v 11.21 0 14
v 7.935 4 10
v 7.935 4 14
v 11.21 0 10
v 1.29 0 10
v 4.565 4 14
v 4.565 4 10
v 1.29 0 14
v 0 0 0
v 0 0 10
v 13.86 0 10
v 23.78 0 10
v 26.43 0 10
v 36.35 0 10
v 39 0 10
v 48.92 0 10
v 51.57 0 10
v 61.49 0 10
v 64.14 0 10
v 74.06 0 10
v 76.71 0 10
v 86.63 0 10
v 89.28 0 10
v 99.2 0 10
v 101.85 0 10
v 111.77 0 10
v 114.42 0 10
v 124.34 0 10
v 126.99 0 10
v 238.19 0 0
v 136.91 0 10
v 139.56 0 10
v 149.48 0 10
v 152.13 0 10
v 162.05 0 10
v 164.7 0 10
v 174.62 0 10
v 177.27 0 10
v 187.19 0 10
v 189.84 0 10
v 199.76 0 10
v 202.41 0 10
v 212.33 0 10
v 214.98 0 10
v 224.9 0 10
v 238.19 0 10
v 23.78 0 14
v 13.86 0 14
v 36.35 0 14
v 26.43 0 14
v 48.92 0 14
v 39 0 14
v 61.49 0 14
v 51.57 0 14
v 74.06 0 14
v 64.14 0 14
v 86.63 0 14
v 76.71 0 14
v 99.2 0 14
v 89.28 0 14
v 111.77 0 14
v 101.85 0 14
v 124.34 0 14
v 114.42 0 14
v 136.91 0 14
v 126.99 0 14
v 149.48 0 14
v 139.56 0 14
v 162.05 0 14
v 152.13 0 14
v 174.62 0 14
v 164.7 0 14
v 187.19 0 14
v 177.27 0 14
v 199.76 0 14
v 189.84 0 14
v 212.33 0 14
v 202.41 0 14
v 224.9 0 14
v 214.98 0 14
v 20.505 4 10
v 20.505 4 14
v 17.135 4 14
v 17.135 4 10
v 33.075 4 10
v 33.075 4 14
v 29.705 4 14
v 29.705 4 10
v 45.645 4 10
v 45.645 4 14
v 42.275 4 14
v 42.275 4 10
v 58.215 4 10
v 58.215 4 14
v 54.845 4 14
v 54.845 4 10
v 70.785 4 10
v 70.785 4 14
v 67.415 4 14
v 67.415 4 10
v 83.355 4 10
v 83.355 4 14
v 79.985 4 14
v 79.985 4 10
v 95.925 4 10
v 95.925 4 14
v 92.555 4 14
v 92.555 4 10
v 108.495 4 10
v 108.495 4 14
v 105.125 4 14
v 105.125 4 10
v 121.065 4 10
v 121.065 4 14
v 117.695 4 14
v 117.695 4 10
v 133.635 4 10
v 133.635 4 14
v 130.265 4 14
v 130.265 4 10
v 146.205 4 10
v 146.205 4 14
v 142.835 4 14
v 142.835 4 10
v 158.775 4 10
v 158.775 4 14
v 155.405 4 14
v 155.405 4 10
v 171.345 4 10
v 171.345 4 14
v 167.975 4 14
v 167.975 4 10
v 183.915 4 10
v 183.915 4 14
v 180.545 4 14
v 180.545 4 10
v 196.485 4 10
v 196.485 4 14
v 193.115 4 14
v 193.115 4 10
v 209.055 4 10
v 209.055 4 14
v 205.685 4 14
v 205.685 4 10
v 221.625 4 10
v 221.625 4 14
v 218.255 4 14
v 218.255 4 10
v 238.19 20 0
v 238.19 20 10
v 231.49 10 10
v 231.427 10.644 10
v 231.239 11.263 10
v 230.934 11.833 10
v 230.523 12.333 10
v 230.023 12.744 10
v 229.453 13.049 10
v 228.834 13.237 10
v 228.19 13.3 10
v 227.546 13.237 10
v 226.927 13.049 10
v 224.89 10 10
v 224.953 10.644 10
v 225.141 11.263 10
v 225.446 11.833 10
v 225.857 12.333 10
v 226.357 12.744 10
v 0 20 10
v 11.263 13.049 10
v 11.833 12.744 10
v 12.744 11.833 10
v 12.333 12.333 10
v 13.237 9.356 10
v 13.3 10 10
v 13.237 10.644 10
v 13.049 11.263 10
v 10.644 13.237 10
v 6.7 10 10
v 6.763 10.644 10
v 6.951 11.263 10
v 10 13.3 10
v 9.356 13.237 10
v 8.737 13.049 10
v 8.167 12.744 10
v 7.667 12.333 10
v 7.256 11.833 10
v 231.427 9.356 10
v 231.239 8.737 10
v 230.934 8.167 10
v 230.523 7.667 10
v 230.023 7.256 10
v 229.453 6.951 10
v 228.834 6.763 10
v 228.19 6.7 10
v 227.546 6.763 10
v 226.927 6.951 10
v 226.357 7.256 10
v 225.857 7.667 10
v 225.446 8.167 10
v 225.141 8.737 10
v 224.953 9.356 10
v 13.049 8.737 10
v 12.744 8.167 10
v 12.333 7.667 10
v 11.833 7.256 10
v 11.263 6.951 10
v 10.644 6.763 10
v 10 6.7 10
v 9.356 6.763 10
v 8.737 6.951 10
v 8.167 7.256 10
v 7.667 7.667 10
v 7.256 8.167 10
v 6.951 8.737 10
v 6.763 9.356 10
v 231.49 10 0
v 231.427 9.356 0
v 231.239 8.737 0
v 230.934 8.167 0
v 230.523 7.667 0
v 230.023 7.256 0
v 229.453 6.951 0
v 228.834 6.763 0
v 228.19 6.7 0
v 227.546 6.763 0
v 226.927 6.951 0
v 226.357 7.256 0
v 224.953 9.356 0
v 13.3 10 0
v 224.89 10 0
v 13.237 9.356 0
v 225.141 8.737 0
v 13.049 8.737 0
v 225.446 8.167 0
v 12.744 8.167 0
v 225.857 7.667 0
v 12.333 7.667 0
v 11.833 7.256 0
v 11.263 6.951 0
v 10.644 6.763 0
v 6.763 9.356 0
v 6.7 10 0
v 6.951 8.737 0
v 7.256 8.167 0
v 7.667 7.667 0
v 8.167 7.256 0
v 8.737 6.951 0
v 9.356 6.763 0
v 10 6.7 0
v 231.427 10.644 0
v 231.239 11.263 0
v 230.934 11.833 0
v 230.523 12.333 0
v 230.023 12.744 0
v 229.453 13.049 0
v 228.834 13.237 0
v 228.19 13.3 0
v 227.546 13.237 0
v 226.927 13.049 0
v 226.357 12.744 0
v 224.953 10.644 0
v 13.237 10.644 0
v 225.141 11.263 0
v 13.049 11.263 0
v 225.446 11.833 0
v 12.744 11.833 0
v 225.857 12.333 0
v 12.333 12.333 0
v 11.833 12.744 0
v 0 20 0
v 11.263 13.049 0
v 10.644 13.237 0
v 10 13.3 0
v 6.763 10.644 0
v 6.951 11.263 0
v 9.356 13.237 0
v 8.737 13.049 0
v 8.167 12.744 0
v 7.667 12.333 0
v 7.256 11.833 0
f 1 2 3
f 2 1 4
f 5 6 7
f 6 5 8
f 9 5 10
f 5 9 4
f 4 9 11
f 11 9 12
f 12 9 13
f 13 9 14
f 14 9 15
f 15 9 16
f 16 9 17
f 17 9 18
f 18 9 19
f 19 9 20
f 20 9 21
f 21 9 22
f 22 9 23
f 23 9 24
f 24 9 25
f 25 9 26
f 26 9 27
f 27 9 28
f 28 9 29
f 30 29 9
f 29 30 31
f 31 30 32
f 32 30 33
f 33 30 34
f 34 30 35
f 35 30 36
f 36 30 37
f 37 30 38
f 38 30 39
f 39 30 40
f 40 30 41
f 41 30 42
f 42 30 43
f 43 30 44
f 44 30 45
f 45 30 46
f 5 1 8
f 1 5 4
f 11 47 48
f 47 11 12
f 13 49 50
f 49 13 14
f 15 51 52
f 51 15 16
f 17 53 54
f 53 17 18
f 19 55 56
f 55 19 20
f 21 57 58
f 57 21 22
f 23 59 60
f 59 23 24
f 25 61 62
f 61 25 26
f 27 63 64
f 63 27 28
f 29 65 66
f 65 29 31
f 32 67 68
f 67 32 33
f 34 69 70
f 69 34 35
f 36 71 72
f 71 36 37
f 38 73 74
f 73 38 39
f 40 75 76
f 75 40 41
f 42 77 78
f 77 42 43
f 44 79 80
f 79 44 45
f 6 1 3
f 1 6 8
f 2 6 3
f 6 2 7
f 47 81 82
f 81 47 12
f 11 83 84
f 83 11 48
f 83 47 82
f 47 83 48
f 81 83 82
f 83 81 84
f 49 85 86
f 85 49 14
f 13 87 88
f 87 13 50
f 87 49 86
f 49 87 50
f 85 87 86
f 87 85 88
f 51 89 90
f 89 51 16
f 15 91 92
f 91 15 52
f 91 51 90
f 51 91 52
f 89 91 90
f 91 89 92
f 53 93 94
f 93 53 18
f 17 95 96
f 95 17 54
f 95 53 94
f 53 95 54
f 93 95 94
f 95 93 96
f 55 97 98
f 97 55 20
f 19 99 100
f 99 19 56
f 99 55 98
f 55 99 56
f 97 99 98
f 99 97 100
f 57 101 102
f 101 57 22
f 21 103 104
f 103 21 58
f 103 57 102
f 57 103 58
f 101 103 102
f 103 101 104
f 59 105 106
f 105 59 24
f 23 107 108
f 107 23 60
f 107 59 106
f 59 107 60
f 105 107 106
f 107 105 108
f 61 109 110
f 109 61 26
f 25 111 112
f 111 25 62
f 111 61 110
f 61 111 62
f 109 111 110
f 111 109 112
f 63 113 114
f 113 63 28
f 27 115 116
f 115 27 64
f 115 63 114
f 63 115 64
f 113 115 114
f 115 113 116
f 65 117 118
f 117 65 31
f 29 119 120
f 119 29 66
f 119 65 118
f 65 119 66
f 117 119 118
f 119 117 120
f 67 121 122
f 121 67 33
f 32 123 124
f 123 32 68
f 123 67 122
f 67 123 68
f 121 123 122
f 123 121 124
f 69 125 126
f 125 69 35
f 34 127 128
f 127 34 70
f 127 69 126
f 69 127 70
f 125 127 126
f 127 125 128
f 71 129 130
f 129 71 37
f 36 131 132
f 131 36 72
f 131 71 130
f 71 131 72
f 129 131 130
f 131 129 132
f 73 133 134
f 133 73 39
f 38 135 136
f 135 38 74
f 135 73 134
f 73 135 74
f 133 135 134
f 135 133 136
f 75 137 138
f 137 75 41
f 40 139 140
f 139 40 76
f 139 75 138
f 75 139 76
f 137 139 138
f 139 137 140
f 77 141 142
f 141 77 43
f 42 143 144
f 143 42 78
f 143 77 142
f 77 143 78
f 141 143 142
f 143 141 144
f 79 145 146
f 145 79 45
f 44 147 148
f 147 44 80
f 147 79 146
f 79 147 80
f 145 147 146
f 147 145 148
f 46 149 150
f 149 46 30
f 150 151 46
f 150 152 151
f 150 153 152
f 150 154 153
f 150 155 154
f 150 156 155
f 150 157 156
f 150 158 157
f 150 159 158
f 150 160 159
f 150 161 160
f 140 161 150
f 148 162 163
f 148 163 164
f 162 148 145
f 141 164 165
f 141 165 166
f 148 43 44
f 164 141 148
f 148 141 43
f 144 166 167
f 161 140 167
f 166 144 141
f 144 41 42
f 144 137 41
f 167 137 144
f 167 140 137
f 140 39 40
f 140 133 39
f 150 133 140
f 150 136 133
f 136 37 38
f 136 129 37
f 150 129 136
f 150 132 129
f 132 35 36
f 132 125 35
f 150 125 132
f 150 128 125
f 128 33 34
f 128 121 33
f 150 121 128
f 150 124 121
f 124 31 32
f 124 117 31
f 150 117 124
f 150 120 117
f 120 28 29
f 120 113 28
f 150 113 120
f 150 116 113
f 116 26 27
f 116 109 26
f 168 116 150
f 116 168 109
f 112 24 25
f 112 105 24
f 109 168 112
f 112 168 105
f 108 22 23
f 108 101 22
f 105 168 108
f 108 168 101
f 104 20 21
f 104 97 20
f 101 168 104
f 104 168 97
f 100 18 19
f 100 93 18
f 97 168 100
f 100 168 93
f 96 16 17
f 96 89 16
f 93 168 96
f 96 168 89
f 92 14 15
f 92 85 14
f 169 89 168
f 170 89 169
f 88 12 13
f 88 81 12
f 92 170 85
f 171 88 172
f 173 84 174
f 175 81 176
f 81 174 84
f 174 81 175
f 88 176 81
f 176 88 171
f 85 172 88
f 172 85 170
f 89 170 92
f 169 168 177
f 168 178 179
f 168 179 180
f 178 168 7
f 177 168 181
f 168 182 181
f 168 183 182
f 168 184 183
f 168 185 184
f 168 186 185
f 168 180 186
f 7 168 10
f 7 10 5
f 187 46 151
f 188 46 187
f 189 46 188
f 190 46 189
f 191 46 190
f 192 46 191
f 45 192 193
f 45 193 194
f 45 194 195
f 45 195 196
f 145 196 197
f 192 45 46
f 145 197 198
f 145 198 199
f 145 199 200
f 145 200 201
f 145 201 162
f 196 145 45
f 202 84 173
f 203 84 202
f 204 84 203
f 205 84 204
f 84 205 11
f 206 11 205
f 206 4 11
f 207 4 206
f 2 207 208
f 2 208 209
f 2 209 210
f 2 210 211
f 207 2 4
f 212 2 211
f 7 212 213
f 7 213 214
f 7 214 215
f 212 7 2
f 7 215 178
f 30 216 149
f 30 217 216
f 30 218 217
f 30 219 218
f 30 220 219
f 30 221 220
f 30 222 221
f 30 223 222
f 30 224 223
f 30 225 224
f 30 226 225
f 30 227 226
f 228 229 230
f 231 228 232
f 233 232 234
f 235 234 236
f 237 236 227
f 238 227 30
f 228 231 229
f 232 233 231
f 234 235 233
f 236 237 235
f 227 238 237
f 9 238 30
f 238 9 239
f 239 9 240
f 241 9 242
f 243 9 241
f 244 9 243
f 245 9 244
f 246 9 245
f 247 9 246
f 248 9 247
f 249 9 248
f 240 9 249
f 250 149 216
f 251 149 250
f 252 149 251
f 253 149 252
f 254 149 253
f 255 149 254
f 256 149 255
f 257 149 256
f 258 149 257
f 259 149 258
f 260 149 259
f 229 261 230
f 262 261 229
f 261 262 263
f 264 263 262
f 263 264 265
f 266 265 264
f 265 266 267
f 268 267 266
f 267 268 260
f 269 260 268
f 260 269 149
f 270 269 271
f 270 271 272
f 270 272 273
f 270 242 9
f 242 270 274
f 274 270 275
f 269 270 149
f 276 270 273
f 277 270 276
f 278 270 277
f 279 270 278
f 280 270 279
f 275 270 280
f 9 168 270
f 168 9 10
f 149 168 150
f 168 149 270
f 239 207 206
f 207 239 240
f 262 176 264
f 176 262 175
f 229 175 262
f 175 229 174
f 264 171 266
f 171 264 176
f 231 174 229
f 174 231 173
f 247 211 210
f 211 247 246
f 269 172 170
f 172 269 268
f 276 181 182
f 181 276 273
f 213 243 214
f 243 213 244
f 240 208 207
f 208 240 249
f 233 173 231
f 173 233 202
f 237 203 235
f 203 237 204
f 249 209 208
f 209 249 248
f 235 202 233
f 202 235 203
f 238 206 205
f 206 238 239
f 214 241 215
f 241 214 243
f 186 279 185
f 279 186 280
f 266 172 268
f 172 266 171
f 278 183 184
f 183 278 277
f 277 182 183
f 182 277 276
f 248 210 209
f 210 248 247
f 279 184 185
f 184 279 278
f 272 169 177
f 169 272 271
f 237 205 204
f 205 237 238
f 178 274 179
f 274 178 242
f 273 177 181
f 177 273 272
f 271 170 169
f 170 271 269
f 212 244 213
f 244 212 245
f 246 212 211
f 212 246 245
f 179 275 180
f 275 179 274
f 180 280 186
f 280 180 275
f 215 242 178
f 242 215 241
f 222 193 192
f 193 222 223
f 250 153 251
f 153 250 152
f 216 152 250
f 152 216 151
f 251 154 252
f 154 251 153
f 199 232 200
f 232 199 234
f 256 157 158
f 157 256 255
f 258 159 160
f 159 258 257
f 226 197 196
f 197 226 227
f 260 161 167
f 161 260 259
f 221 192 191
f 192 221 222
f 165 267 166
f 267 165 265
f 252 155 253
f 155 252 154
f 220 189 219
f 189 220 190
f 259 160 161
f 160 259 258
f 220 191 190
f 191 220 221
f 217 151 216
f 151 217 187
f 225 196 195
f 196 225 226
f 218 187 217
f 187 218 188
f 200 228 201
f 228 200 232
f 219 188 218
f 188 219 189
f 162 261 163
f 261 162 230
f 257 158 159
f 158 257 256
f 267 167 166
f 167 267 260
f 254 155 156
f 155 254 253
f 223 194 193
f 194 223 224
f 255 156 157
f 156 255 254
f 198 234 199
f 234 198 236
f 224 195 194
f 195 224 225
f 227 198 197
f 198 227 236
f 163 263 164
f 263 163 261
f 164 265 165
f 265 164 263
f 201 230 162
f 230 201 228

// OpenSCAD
$fn = 32;

// ----------------------------------------------------------------------
// Gear rack: m=4 z=18, 238.19 x 20 x 14 mm
// ----------------------------------------------------------------------

// --- parameters (mm) ---
length = 238.19;          // rack length, X
width = 20;               // rack width, Y
height = 14;              // overall height, Z
module_m = 4;             // module
back_t = 10;              // tooth root line height
pitch = 12.57;            // circular pitch
tip_w = 3.37;             // tooth thickness at the tip
root_w = 9.92;            // tooth thickness at the root line
hole_d = 6.6;             // mounting hole
sink = 0.6;               // tooth root overlap into the body

tooth_span = 226.19;

module tooth(x0) {
  /* 20 deg flank profile, sunk into the body for a positive overlap */
  translate([x0, 0, back_t - sink])
    linear_extrude(height = height - back_t + sink)
      polygon(points = [[-root_w / 2, 0], [root_w / 2, 0],
                        [tip_w / 2, height - back_t],
                        [-tip_w / 2, height - back_t]]);
}

difference() {
  union() {
    cube([length, width, back_t]);
    for (i = [0 : 18 - 1])
      tooth((i + 0.5) * pitch + (tooth_span - 18 * pitch) / 2);
  }
  translate([10, 10, -1]) cylinder(h = back_t + 2, d = hole_d);
  translate([228.19, 10, -1]) cylinder(h = back_t + 2, d = hole_d);
}
